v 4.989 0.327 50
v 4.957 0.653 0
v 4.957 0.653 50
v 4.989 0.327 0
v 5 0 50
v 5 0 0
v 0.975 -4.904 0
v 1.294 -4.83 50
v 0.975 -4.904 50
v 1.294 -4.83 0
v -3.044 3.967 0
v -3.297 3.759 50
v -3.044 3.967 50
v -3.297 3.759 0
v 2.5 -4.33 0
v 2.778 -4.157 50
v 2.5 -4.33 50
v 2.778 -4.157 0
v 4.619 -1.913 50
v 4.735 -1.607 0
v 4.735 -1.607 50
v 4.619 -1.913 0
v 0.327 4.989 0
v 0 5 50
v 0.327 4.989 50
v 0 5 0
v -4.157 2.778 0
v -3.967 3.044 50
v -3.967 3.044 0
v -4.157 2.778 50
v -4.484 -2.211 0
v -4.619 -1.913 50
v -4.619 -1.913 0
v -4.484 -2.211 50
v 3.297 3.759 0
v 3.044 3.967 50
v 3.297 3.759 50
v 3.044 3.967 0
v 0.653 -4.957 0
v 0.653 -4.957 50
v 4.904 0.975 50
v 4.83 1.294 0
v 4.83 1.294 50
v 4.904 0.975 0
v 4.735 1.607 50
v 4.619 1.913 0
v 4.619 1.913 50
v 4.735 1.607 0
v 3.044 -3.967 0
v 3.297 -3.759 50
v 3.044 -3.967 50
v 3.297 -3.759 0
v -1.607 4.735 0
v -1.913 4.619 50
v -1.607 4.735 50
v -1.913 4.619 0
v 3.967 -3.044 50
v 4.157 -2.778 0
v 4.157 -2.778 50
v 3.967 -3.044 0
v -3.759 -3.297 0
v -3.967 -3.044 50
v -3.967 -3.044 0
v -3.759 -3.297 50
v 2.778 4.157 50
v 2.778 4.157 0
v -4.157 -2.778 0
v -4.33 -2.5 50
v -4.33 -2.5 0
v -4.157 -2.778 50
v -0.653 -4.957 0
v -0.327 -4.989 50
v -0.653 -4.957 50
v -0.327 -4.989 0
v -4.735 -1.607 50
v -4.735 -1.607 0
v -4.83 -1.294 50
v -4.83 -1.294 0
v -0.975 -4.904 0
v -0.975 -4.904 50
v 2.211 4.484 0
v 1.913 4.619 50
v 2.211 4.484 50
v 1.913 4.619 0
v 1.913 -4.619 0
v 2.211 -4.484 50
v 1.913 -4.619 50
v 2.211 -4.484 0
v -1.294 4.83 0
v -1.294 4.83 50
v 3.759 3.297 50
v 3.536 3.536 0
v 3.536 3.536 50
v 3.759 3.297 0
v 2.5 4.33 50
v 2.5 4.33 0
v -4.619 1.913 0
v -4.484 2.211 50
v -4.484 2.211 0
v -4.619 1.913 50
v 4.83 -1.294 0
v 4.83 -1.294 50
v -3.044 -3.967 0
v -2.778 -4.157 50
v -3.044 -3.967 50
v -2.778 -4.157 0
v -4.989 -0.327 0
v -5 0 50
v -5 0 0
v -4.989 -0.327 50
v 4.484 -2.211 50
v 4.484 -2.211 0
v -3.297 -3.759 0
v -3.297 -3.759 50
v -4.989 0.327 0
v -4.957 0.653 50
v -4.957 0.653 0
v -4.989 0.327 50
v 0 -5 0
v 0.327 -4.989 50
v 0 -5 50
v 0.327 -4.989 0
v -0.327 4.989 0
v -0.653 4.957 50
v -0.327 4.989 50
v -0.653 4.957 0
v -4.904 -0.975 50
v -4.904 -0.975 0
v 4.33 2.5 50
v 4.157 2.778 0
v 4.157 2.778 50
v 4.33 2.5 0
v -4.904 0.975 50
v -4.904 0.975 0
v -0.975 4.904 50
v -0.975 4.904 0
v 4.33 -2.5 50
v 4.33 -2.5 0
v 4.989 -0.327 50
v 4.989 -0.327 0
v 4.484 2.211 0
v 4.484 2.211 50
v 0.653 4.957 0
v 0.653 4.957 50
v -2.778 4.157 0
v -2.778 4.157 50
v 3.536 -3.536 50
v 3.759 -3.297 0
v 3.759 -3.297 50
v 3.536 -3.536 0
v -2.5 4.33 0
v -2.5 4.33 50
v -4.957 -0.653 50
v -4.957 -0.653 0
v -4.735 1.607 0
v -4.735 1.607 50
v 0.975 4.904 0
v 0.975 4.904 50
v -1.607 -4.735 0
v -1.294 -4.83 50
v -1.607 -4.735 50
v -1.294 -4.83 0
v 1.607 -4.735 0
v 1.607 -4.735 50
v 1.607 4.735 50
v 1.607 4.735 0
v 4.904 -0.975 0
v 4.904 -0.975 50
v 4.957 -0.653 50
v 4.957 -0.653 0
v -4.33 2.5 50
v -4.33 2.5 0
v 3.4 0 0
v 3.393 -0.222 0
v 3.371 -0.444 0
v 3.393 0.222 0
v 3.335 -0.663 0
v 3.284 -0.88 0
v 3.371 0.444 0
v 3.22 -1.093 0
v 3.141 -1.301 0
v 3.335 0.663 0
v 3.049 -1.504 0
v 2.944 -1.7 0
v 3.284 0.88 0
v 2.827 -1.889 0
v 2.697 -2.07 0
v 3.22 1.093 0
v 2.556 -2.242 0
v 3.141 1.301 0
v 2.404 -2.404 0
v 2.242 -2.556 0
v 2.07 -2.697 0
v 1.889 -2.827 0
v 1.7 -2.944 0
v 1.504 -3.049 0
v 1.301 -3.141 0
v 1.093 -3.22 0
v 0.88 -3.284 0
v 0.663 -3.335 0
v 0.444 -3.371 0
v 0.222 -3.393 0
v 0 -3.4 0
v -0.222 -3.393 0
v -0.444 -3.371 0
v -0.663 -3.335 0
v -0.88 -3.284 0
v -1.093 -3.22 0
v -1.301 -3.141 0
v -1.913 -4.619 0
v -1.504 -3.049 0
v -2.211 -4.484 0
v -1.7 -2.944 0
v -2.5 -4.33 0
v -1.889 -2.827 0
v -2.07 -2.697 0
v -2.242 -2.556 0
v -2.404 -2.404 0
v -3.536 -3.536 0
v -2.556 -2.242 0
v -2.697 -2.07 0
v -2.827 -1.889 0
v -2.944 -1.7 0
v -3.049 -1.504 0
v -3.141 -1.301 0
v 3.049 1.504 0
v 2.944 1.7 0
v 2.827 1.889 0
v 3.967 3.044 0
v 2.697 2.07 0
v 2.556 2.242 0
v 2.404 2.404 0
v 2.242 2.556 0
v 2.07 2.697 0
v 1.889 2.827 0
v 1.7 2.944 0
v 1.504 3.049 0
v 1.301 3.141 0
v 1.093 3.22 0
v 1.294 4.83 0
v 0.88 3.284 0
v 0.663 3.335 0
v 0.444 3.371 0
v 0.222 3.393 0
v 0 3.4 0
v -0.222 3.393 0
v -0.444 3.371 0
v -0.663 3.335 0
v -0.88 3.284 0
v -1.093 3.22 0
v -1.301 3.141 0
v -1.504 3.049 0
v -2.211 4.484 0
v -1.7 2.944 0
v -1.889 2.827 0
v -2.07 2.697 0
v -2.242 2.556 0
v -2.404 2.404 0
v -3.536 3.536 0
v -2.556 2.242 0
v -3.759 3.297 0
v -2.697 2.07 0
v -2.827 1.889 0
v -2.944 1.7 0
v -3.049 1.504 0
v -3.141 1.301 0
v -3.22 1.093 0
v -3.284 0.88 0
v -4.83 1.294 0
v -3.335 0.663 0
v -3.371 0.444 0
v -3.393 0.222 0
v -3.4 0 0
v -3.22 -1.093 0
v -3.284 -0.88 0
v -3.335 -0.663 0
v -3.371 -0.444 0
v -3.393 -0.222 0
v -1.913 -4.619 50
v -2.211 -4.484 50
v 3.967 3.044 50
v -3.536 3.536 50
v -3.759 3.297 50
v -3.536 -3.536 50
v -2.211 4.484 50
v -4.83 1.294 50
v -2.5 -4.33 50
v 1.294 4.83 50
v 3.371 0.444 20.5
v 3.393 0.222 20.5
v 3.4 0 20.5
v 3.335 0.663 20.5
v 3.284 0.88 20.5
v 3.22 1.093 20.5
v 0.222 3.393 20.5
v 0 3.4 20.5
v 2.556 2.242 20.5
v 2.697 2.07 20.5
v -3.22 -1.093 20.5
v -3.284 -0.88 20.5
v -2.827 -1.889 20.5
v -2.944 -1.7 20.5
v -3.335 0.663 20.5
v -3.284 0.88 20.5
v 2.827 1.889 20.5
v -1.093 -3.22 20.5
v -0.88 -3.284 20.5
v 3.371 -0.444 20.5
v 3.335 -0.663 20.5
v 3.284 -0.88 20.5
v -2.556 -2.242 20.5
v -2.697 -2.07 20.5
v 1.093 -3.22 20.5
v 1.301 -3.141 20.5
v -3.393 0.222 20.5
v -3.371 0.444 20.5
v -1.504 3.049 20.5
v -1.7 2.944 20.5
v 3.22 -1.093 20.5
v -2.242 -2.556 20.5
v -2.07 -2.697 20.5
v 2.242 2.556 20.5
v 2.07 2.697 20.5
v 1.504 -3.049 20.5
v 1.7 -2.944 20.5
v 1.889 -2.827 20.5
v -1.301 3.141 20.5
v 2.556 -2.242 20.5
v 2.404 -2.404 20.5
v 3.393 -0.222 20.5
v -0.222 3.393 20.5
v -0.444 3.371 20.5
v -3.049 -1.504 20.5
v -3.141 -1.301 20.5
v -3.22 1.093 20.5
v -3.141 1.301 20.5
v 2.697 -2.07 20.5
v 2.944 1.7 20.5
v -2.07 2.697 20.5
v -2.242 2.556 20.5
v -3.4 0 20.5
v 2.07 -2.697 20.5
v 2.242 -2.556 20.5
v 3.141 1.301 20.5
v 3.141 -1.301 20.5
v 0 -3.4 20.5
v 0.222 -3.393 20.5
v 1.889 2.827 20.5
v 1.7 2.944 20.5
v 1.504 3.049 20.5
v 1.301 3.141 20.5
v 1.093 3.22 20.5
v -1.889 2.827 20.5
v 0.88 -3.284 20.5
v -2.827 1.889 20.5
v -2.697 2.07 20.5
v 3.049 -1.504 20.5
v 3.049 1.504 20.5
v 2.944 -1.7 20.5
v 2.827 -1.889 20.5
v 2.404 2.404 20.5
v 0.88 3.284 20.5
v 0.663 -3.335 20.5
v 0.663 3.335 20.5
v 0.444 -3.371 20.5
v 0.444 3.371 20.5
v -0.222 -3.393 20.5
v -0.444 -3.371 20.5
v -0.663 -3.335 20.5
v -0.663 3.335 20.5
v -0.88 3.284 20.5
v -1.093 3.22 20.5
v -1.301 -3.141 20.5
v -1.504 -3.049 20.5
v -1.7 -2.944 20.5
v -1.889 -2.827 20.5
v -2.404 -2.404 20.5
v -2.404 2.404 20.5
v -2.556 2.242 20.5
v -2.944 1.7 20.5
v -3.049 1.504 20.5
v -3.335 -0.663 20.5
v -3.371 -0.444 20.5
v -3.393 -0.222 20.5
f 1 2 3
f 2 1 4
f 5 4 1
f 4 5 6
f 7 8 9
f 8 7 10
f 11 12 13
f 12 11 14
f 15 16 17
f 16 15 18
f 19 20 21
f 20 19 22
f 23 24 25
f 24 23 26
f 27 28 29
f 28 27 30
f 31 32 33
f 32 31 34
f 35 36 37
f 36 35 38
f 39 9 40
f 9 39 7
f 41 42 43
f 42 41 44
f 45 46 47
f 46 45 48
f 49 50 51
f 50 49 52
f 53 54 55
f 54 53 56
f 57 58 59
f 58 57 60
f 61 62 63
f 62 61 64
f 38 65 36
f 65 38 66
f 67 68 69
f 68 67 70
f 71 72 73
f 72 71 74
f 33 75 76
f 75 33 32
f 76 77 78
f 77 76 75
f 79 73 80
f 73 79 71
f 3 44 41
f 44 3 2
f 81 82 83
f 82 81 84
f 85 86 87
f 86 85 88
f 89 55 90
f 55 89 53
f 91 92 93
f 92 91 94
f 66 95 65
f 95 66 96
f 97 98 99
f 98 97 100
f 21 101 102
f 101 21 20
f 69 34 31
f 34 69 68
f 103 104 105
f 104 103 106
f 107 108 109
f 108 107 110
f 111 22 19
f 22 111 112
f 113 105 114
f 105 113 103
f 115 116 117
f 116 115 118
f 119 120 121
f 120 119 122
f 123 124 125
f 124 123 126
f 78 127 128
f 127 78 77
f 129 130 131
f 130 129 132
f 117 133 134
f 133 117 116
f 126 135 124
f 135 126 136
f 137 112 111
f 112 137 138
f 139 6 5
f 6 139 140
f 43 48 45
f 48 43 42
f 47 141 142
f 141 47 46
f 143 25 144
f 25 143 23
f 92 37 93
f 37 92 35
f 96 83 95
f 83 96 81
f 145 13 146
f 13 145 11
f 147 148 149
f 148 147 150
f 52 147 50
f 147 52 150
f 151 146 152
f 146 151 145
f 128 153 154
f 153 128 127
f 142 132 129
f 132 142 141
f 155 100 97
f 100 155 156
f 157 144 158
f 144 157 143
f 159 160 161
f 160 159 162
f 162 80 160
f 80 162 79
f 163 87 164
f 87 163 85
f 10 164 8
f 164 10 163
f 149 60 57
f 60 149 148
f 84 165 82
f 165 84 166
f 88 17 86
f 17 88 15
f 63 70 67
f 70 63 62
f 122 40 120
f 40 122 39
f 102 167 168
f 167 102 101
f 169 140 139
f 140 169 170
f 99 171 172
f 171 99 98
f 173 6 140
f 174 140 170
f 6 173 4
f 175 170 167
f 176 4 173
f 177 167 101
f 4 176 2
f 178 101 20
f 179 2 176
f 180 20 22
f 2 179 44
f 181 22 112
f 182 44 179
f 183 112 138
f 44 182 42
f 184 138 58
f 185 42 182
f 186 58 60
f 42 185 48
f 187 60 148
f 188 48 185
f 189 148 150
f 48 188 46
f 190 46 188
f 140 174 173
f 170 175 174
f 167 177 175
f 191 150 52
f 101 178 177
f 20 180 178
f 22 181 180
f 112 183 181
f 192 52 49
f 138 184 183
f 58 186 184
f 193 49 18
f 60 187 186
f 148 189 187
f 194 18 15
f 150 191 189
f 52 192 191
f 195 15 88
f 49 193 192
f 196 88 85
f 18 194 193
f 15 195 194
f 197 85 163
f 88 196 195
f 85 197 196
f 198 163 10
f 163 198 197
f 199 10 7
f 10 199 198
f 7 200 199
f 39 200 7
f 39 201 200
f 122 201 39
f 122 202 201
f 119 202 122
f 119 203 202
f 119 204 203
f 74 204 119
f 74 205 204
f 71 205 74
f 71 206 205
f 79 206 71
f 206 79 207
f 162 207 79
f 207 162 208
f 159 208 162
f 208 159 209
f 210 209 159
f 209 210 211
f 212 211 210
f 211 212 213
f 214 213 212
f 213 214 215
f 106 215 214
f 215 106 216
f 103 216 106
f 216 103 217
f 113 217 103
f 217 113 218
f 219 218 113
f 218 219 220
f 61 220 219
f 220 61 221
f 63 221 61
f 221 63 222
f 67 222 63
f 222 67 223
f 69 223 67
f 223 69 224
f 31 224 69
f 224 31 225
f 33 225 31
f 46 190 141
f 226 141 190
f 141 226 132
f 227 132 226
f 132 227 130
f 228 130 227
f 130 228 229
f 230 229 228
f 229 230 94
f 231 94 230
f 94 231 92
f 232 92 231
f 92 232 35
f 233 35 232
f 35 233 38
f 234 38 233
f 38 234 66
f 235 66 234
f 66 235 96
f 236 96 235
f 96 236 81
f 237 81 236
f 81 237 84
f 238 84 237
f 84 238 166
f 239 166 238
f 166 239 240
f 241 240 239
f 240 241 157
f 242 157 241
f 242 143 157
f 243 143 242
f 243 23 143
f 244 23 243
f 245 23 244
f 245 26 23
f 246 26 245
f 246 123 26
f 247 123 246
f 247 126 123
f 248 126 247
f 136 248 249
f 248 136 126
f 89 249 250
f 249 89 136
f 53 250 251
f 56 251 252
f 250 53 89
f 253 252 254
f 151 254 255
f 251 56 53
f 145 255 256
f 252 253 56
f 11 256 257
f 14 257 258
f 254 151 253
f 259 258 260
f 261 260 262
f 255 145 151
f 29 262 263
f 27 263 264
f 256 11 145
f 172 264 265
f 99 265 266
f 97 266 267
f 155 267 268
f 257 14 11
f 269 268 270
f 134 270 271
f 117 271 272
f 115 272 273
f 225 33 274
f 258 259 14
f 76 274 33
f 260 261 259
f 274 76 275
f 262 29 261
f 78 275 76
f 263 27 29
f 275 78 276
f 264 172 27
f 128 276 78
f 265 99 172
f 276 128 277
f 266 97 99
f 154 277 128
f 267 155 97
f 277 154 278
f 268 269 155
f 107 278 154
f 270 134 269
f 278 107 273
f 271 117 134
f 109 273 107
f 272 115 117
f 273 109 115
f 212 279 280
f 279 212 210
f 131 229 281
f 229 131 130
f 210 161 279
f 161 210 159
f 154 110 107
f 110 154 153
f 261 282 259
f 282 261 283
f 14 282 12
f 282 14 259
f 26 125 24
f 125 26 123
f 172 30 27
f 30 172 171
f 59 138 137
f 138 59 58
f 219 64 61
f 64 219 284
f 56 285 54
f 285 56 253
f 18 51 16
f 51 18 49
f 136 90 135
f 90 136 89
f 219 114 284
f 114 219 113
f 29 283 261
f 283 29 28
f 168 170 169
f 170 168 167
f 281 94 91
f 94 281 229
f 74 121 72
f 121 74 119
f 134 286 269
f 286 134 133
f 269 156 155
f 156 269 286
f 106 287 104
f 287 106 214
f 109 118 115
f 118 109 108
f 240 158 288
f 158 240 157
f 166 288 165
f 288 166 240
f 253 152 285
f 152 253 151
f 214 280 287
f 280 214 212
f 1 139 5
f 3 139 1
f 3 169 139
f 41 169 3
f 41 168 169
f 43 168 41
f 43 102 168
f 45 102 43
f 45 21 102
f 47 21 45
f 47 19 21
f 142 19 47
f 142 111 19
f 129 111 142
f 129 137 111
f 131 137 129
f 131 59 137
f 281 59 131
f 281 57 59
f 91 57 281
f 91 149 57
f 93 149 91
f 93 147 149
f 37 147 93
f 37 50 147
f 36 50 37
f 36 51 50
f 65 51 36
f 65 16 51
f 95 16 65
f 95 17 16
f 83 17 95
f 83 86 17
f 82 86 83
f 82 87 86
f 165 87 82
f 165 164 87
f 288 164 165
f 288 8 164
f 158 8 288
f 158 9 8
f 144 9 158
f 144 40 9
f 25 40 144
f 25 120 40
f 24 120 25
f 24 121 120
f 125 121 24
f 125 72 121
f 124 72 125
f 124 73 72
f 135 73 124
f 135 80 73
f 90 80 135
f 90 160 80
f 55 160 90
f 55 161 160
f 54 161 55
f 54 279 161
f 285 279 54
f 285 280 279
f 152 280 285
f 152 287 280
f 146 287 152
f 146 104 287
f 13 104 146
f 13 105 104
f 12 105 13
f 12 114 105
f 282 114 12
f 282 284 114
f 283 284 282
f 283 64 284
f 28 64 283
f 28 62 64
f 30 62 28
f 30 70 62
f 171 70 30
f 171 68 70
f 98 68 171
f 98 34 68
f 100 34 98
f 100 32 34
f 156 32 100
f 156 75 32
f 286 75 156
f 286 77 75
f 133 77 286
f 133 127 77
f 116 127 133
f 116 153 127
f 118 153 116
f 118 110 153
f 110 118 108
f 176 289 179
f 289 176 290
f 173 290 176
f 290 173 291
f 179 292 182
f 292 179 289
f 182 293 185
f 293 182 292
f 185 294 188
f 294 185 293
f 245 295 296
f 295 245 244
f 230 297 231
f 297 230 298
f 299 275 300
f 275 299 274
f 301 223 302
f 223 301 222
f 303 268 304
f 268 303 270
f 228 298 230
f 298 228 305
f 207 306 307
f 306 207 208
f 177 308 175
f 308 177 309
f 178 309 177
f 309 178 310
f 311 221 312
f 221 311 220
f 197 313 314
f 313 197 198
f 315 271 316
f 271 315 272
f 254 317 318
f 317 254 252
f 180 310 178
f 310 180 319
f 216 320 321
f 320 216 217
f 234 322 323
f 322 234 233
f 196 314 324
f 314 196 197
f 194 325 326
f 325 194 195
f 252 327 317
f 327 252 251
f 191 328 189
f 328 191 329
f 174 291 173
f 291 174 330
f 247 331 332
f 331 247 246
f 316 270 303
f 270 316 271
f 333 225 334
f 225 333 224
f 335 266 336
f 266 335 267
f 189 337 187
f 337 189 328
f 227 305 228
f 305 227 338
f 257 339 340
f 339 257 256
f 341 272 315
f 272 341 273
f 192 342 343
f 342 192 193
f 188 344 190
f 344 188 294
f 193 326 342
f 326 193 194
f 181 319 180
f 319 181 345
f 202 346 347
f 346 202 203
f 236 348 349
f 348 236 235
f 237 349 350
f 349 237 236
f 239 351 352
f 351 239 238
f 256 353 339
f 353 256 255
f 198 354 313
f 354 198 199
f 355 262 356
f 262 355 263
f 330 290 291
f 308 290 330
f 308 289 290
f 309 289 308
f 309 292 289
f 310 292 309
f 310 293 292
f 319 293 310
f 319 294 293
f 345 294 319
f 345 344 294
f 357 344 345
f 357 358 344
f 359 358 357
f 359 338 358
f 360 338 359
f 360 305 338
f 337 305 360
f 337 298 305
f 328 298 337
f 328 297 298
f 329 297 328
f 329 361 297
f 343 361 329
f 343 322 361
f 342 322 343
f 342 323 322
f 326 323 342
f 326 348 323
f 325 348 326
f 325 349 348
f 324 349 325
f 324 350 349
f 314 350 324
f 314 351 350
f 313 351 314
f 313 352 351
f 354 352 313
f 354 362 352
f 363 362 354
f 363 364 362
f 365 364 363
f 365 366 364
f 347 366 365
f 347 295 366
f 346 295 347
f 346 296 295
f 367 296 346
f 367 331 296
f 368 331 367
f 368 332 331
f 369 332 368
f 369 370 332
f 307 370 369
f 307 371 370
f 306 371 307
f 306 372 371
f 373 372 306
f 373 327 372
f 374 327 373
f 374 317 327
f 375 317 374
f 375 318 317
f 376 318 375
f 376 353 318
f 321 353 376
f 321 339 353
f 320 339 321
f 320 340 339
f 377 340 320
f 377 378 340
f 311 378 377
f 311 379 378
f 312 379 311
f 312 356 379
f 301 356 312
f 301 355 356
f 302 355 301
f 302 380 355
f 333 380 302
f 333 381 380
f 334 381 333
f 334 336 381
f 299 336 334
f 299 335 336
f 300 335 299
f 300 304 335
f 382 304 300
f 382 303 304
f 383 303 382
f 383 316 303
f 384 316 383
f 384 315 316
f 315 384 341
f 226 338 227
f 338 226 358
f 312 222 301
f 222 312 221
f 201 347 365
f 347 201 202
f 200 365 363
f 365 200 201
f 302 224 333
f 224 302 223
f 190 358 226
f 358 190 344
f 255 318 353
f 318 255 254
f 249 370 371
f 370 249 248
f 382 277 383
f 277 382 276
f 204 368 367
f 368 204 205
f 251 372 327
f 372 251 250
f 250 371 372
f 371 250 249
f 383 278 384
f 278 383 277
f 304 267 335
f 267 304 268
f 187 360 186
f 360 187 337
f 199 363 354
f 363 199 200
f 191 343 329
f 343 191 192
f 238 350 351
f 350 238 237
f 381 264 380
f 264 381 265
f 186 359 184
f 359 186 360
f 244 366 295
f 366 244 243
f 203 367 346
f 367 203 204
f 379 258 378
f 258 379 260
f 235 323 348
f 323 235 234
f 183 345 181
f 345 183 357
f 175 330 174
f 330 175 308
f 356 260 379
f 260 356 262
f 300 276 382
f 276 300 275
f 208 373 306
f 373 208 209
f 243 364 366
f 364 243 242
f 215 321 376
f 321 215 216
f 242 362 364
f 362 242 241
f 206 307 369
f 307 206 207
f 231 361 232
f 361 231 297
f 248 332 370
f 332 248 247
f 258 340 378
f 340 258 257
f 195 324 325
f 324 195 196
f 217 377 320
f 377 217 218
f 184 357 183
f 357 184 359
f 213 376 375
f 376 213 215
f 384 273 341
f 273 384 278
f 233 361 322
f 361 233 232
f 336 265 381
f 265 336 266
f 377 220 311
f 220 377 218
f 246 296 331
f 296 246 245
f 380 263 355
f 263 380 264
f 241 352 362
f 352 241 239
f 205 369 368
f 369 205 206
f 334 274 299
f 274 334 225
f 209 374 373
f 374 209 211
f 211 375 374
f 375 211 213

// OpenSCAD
// Lab funnel - printed upright, open at top and bottom
// Units: mm

// ---- Parameters ----
spout_od      = 10;    // spout outer diameter
spout_h       = 20;    // spout height (z = 0 to 20)
cone_bottom_d = 10;    // cone outer diameter at z = 20 (matches spout)
cone_top_d    = 60;    // cone outer diameter at rim (z = 50)
wall          = 1.6;   // wall thickness everywhere
eps           = 0.5;   // cutter overshoot past faces

$fn = 96;

// ---- Derived ----
spout_id = spout_od - 2 * wall;   // bore diameter (6.8 mm)
cone_h   = 50 - 20;               // cone height (30 mm)

// ---- Model ----
difference() {
    union() {
        // Spout: straight tube from z = 0 to 20
        cylinder(d = spout_od, h = spout_h);

        // Cone: widens from 10 mm at z = 20 to 60 mm at z = 50
        translate([0, 0, spout_h])
            cylinder(d = cone_bottom_d, h = cone_h);
    }

    // Bottom cutter: open the spout bore through z = 0
    translate([0, 0, -eps])
        cylinder(d = spout_id, h = spout_h + 2 * eps);

    // Top cutter: open the funnel rim at z = 50
    translate([0, 0, 50 + eps])
        cylinder(d = cone_top_d, h = eps);
}
